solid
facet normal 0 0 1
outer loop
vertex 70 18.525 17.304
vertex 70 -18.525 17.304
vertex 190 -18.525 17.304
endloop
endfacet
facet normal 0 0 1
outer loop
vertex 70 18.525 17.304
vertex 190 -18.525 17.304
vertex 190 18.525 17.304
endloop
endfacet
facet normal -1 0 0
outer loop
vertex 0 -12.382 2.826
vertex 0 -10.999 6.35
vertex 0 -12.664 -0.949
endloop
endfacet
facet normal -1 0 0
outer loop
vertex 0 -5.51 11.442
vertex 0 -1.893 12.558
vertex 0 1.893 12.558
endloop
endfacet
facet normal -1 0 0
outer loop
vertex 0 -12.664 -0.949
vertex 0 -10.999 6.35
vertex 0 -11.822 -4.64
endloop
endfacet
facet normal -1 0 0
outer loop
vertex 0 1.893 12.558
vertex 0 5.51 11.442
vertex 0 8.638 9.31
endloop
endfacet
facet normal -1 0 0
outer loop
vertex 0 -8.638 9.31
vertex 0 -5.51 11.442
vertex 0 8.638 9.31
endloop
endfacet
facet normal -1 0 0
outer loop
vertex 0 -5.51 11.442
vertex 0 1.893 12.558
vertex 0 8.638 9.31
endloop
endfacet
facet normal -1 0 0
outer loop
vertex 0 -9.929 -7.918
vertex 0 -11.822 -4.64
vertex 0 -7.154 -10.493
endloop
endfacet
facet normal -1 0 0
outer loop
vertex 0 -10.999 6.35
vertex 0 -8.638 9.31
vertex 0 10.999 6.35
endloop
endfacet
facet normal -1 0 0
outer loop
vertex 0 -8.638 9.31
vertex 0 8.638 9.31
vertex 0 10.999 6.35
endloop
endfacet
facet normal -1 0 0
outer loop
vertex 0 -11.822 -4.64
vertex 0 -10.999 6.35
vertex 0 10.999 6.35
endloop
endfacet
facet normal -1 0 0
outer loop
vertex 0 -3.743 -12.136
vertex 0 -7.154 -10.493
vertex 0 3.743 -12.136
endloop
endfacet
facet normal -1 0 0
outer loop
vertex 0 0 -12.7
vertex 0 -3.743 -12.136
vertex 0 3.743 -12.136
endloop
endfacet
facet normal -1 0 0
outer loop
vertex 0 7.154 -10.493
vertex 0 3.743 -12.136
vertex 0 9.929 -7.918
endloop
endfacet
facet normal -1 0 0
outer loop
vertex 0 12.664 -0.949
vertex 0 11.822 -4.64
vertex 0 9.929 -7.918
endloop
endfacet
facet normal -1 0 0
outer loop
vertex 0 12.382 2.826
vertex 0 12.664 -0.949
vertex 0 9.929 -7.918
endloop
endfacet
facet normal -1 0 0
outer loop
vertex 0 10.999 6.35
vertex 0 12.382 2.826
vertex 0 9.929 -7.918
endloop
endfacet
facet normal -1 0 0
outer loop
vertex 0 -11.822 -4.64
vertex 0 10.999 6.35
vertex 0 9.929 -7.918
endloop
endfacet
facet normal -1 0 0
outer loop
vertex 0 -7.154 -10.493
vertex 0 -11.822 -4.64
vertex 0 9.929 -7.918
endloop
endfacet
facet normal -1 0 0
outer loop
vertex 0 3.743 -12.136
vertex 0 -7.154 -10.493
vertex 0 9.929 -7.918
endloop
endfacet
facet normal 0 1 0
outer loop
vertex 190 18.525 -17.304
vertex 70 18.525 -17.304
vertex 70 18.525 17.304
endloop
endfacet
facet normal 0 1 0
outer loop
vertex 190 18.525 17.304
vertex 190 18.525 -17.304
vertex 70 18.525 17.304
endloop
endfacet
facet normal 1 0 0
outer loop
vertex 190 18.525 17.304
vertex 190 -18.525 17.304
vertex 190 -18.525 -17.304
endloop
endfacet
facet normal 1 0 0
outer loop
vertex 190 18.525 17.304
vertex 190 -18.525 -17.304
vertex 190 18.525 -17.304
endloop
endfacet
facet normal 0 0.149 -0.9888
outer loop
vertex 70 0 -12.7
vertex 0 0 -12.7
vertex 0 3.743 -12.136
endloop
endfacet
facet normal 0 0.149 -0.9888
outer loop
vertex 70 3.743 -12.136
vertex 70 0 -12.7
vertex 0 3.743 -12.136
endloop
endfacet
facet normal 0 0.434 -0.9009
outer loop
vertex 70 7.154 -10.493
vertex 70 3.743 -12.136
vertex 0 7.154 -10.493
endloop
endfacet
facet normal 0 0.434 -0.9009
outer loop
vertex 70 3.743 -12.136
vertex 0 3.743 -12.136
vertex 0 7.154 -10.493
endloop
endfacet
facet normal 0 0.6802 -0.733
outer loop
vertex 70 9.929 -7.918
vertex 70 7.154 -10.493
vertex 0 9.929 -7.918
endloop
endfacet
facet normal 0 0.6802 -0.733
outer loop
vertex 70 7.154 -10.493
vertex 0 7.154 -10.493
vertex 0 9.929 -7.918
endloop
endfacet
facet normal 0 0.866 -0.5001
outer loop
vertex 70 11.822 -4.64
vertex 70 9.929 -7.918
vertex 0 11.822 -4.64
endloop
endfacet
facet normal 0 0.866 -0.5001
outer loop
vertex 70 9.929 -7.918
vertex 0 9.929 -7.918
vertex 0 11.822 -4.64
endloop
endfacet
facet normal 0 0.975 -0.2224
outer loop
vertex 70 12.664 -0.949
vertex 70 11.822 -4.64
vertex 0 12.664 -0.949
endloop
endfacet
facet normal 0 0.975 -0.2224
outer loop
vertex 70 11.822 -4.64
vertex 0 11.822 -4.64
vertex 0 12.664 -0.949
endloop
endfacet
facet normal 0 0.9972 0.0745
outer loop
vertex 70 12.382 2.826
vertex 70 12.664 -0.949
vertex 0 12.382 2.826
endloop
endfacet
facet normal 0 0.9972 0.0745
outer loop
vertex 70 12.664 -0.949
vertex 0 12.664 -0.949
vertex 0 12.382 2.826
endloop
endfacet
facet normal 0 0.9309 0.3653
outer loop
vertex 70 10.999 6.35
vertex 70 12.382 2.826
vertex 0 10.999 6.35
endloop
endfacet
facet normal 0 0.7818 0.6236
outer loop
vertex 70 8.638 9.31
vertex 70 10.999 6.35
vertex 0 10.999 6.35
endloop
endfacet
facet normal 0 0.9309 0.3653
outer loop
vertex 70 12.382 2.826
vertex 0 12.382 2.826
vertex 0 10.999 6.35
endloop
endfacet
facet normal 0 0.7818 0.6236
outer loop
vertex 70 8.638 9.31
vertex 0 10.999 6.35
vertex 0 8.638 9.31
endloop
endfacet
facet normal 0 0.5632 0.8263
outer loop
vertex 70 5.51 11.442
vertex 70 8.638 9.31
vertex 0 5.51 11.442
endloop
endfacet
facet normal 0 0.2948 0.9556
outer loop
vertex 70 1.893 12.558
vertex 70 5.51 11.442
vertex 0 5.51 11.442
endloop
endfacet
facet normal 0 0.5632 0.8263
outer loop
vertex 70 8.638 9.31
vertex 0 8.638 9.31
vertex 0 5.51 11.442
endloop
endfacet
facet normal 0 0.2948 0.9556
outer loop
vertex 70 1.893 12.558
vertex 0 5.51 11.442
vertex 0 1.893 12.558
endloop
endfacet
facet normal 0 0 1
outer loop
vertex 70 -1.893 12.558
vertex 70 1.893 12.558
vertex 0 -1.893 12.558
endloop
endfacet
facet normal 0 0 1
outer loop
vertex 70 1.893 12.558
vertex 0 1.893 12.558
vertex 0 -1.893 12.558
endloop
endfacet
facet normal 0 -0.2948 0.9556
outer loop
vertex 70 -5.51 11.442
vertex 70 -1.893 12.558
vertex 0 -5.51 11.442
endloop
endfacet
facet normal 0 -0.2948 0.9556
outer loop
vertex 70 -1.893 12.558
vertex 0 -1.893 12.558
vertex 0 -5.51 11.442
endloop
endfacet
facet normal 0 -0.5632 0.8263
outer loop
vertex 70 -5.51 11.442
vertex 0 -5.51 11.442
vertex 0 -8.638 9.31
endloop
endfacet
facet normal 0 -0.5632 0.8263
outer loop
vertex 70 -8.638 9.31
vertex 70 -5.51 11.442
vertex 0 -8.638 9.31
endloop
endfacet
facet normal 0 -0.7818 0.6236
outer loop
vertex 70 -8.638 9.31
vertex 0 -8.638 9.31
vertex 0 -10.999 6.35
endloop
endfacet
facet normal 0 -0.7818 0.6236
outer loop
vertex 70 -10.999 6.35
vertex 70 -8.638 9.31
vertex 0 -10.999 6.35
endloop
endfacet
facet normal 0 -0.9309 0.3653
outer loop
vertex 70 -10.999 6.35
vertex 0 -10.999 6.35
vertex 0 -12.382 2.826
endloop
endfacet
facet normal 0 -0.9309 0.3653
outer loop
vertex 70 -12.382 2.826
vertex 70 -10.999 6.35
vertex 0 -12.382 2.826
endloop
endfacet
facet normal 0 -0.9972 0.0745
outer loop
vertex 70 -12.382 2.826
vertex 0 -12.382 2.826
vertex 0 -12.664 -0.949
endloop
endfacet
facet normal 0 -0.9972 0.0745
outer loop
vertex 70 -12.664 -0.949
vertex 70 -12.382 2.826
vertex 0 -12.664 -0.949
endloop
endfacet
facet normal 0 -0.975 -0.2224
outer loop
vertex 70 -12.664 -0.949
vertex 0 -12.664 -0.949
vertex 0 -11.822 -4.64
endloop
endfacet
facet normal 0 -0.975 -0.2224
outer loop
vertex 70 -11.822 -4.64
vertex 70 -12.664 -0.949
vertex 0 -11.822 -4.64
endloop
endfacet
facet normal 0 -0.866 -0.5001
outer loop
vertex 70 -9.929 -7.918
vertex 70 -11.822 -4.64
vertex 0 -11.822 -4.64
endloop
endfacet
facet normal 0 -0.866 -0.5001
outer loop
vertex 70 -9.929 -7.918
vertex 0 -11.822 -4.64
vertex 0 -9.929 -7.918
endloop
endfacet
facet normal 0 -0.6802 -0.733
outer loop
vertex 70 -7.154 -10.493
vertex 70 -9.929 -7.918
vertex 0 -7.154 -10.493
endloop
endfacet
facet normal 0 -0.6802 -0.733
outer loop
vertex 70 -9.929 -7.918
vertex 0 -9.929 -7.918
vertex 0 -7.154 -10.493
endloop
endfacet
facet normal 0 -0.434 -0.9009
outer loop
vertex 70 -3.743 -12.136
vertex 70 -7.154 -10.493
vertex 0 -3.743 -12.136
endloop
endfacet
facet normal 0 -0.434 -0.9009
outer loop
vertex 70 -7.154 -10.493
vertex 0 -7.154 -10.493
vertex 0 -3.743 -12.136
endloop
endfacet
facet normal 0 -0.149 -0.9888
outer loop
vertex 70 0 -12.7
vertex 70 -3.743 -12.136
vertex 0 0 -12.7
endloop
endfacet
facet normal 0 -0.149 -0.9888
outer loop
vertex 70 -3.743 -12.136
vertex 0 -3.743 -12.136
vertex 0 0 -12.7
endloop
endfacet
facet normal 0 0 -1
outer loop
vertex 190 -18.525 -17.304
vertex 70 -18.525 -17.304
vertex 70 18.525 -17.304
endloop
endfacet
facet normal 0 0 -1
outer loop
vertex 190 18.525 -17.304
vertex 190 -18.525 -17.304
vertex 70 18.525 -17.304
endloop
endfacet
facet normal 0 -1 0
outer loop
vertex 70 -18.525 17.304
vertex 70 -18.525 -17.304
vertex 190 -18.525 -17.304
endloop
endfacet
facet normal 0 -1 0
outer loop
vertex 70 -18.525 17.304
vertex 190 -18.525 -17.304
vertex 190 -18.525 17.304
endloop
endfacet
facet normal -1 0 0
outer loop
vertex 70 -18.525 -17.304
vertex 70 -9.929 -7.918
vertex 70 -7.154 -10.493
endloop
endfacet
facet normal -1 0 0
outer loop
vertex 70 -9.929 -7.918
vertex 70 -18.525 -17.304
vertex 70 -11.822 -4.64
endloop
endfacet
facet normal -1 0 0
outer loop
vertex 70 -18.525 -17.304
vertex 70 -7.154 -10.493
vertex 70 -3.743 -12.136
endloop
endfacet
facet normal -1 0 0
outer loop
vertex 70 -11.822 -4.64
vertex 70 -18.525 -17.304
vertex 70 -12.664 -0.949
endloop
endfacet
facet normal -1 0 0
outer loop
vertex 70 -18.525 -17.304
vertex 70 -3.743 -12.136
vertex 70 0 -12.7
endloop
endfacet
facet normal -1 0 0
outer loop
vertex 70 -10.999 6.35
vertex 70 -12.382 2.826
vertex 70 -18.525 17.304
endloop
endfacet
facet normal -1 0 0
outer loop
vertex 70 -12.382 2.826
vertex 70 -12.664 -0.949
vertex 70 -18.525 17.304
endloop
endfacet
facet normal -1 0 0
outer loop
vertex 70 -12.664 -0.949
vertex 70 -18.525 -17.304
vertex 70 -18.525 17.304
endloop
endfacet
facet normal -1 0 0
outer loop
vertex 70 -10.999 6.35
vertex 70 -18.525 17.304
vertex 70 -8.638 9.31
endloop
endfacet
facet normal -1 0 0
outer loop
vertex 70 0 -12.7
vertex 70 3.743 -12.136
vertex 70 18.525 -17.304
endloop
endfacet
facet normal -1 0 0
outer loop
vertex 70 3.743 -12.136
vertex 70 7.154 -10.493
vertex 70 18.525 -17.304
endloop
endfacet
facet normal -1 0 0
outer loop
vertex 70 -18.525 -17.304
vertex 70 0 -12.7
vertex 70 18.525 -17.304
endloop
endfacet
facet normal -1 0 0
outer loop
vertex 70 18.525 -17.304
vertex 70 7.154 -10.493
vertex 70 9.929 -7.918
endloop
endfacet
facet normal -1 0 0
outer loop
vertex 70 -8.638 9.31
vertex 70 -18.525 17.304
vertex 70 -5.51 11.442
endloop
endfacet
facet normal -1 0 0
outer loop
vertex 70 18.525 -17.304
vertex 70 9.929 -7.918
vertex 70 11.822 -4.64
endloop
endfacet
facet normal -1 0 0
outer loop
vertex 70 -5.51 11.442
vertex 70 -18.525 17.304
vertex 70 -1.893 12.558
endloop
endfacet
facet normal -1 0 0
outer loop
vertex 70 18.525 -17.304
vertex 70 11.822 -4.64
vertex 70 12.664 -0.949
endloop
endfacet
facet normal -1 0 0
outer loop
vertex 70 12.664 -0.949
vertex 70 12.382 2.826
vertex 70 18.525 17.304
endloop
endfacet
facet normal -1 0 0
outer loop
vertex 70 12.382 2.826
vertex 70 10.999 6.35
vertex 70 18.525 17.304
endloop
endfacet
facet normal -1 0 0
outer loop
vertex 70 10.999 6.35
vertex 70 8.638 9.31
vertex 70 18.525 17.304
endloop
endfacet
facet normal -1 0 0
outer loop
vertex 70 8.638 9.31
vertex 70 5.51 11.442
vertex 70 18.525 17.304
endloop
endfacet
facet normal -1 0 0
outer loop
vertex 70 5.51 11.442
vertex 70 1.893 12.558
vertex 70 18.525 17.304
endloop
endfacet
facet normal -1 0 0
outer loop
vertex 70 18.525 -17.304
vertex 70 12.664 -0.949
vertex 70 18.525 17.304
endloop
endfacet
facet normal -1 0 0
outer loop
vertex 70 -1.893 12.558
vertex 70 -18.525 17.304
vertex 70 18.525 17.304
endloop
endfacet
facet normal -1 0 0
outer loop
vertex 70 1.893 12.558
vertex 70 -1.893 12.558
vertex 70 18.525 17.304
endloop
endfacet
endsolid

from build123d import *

# Parameters (mm, degrees)
SKETCH1_R           = 12.7
BOSS_EXTRUDE1_DEPTH = 70
SKETCH2_W           = 37.050168224
SKETCH2_H           = 34.6077549
BOSS_EXTRUDE2_DEPTH = 120


with BuildPart() as part:
    # Sketch1 → Boss-Extrude1 (new body)
    with BuildSketch(Plane.YZ):
        with Locations(Location((0, 0, 0), (0, 0, 270))):
            Circle(SKETCH1_R)
    extrude(amount=BOSS_EXTRUDE1_DEPTH)

    # Sketch2 → Boss-Extrude2 (add)
    with BuildSketch(Plane.YZ.offset(70)):
        Rectangle(SKETCH2_W, SKETCH2_H)
    extrude(amount=BOSS_EXTRUDE2_DEPTH)


solid = part.part
